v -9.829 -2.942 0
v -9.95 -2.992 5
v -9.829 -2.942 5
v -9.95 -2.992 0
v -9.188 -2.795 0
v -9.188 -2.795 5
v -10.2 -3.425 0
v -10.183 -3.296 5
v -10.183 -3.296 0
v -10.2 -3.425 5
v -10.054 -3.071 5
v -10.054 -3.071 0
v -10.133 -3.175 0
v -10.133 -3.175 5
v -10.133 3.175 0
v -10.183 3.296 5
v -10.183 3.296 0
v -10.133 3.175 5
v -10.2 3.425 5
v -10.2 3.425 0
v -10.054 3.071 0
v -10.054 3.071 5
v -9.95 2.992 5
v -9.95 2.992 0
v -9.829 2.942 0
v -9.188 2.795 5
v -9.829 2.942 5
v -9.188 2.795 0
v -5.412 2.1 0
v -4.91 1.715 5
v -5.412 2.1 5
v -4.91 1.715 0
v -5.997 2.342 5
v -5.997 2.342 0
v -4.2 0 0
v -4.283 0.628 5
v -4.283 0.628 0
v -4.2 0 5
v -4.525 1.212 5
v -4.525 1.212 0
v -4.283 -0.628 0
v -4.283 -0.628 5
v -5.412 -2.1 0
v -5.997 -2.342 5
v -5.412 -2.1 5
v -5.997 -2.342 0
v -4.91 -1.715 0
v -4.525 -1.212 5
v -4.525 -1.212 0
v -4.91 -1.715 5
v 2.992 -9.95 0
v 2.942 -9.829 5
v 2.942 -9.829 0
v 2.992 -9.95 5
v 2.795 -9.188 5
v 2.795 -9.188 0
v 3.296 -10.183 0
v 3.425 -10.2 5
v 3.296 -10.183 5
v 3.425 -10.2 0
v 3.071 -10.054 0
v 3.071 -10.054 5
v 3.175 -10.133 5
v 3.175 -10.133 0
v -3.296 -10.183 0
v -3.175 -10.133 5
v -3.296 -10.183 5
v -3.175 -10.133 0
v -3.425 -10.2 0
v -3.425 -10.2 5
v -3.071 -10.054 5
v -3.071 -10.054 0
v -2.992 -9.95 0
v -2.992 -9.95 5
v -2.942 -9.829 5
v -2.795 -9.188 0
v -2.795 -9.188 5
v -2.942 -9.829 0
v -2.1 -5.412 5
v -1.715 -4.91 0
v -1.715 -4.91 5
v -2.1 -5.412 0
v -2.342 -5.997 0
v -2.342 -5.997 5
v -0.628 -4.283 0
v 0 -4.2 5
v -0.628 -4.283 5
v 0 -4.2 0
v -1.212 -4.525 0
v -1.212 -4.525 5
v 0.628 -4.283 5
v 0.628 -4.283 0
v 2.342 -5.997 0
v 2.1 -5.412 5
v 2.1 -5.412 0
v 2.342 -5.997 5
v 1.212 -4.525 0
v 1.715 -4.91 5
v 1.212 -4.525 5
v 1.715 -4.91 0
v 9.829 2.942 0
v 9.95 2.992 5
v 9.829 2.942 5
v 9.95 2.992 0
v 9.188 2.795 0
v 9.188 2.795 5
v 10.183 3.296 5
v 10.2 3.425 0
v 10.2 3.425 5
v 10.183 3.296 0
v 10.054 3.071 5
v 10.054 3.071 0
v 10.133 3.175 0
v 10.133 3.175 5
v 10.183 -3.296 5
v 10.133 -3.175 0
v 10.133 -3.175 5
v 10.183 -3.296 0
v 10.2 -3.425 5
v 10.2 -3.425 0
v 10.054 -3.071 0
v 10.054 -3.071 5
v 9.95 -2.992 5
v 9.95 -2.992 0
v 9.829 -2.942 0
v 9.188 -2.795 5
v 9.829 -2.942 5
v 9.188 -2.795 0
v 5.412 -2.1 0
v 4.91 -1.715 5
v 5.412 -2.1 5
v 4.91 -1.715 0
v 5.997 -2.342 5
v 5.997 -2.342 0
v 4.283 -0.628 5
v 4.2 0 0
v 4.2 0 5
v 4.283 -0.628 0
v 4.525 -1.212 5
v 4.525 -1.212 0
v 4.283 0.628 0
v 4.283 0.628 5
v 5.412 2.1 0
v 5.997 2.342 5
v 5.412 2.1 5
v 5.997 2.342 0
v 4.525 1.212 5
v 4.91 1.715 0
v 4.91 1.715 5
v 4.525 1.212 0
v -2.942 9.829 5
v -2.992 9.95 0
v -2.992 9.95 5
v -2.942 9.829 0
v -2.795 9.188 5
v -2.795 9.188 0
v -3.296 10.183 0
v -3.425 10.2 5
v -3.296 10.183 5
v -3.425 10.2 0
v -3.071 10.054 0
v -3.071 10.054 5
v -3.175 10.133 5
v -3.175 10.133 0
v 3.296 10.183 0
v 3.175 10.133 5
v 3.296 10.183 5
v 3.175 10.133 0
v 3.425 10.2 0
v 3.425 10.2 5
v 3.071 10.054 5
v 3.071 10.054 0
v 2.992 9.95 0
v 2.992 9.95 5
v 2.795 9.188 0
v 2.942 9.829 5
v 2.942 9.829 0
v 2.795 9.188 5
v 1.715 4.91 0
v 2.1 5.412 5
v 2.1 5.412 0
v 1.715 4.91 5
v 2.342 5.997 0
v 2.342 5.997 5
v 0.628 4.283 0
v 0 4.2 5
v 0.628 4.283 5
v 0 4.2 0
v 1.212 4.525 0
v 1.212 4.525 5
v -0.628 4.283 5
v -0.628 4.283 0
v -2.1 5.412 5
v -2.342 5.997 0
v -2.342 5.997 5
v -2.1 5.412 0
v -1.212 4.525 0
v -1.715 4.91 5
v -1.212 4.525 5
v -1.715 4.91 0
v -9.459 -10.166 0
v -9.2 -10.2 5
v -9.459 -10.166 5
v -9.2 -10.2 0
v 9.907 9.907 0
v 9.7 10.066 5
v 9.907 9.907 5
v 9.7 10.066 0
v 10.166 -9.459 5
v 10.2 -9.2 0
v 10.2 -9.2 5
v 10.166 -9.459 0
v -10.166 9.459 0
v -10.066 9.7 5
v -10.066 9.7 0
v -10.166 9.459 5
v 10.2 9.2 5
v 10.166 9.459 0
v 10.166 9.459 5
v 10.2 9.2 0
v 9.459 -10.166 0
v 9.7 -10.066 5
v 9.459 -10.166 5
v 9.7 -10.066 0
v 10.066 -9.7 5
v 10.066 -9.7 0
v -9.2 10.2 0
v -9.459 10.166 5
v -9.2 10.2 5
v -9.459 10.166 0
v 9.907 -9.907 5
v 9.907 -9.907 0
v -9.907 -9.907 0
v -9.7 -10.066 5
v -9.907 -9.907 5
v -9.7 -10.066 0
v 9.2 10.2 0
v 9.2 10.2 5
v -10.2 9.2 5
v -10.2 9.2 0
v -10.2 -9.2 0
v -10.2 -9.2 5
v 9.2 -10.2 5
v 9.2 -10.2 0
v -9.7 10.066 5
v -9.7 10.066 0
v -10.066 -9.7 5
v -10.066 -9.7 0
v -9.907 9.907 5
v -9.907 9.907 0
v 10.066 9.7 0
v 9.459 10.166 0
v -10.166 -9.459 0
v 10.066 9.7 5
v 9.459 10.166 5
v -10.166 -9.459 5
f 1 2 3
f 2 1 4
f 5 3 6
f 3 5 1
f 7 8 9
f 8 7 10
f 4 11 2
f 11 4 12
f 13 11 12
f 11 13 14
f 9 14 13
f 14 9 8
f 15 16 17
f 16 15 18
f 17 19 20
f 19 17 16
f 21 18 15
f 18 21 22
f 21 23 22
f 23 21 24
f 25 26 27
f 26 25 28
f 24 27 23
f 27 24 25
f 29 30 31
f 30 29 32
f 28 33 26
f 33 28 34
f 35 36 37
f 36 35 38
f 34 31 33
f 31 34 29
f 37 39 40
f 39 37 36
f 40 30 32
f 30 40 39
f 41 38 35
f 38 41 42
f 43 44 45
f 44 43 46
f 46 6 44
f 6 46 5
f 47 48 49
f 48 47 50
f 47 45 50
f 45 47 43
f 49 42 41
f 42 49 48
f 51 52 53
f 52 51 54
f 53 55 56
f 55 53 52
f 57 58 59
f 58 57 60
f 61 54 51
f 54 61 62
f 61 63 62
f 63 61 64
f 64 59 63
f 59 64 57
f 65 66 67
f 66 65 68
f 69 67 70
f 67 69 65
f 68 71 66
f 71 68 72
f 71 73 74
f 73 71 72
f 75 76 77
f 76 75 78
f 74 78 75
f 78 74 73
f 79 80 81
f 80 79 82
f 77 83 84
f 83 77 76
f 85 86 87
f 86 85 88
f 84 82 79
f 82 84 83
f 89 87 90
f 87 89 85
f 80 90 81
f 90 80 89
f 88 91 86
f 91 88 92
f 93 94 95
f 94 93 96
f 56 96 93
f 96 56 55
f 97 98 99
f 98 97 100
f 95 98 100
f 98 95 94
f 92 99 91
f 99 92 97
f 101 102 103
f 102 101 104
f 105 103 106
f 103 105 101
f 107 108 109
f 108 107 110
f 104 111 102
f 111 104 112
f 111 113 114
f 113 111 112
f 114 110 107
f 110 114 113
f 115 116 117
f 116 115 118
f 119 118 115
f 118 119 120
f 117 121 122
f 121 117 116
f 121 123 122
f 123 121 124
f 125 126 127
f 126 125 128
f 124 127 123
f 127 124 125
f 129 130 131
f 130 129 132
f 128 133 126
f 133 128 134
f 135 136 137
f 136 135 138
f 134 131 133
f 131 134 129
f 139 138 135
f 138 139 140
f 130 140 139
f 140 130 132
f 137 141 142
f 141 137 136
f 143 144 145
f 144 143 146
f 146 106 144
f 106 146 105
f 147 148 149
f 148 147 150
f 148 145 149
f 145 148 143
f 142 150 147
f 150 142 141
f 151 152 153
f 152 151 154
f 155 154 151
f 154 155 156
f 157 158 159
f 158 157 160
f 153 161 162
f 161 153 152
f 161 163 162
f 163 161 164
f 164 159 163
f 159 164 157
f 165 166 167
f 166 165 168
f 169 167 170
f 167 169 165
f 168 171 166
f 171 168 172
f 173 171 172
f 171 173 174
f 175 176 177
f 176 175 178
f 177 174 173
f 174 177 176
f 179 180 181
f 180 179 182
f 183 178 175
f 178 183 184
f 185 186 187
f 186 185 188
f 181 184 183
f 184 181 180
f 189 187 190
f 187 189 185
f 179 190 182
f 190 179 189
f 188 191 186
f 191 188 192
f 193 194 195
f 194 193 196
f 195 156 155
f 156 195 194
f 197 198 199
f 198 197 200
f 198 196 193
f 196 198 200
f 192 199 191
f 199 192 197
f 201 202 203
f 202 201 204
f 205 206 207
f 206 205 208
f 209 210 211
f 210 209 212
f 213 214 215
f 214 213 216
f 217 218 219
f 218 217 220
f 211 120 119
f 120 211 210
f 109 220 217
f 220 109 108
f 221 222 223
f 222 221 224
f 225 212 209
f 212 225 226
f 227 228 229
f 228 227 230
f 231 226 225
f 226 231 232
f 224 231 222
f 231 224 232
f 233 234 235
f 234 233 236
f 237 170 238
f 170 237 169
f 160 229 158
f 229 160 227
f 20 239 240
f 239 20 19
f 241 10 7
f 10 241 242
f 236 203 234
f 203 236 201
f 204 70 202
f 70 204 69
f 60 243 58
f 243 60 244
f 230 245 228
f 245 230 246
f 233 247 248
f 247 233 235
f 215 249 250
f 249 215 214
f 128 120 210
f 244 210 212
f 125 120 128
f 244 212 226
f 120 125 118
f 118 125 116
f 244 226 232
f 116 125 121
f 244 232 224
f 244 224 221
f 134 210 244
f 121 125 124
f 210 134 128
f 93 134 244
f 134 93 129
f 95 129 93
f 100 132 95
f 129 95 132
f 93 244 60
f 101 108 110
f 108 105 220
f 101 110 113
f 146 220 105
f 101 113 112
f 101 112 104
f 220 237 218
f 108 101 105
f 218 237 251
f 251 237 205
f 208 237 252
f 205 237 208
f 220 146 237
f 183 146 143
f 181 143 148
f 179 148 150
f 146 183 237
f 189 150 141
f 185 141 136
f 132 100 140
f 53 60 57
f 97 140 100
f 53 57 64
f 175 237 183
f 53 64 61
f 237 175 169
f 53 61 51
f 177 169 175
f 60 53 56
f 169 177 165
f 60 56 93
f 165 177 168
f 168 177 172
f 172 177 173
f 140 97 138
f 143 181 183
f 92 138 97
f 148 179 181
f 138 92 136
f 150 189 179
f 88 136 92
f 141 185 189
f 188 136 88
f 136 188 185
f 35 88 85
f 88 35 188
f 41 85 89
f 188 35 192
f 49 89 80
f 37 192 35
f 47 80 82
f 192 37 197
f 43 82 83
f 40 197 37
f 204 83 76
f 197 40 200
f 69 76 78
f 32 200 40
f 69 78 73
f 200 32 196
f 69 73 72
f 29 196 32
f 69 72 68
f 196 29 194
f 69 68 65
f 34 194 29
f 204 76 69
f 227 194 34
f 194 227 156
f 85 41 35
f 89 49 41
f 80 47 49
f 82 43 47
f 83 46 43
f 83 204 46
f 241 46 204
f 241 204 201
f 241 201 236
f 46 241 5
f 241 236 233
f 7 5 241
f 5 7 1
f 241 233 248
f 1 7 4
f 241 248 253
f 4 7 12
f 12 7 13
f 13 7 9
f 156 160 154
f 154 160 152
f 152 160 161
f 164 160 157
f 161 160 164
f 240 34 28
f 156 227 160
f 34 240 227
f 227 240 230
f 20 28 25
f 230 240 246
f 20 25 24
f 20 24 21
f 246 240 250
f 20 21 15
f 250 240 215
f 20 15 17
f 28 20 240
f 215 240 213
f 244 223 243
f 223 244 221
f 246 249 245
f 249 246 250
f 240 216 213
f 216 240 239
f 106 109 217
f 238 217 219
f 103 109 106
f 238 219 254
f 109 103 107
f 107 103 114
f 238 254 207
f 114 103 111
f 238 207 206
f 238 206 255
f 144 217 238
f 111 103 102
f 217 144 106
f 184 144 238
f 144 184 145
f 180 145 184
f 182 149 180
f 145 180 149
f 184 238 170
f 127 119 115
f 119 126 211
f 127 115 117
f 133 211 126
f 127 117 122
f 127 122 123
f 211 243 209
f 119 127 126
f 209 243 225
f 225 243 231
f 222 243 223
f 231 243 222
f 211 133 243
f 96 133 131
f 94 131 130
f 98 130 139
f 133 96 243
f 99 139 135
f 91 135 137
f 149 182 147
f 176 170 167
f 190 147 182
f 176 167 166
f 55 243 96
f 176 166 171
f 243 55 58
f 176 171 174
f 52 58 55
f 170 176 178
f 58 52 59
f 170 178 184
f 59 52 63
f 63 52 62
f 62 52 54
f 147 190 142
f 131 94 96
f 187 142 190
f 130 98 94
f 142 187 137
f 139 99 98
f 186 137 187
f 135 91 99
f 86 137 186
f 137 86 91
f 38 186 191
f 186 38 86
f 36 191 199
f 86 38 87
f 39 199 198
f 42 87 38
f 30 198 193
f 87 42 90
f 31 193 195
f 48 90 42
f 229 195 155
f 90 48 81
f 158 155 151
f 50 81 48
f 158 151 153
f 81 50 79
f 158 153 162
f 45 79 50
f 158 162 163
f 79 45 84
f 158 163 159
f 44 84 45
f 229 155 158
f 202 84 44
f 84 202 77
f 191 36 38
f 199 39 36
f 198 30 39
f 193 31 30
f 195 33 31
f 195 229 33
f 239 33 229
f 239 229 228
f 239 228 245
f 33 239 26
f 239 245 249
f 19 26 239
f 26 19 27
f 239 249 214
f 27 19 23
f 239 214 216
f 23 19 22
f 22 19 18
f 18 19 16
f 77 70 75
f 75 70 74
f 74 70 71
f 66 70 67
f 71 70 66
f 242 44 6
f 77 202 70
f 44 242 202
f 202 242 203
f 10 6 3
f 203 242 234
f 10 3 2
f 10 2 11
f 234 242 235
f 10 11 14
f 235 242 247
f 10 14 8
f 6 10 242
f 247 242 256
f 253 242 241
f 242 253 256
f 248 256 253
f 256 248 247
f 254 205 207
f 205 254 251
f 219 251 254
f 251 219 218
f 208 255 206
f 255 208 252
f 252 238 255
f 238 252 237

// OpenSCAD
module slotT625a(w,rs,re,len) {
$fn=24;
  hull() {
    translate([-w/2+re,-rs-re,0]) cylinder(r=re,h=len);
    translate([  -1   ,-rs-5 ,0]) cube([1,7,len]);
    translate([-w/2-0.5,-10  ,0]) cube([w/2,1,len]);
  }
}

module slotT625(len,fuzz) {
rs=6.25/2-fuzz;
d=6;
re=0.5;
$fn=24;
w=20+fuzz*2;
  difference() {
    translate([-w/2-2,-9,0]) cube([w/2+2,18,len]);

    translate([0,0,-1]) difference() {
      union() {
        translate([-w/2+3,-10,0]) cube([w/2-2,20,len+2]);
        slotT625a(w,rs,re,len+2);
        mirror([0,1,0]) slotT625a(w,rs,re,len+2);
      }

      translate([-w/2,0,-1]) hull() {
        translate([0,-rs,0]) cube([0.1,2*rs,len+2]);
        translate([d-rs+.5,0,0]) cylinder(r=rs-.5,h=len+2);
      }
    }
  }
}

module ext20(len,fuzz) {
w=20+fuzz*2;
ro=1;
$fn=24;
  difference() {
    hull() {
      translate([-w/2+ro,-w/2+ro,0]) cylinder(r=ro,h=len);
      translate([-w/2+ro, w/2-ro,0]) cylinder(r=ro,h=len);
      translate([ w/2-ro, w/2-ro,0]) cylinder(r=ro,h=len);
      translate([ w/2-ro,-w/2+ro,0]) cylinder(r=ro,h=len);
    }

    translate([0,0,-1]) {
      for (a=[0,90,180,270]) {
        rotate([0,0,a])
          slotT625(len+2,fuzz);
      }
      %cylinder(r=4.25/2,h=len+2);
    }
  }
}

ext20(5,0.2);
